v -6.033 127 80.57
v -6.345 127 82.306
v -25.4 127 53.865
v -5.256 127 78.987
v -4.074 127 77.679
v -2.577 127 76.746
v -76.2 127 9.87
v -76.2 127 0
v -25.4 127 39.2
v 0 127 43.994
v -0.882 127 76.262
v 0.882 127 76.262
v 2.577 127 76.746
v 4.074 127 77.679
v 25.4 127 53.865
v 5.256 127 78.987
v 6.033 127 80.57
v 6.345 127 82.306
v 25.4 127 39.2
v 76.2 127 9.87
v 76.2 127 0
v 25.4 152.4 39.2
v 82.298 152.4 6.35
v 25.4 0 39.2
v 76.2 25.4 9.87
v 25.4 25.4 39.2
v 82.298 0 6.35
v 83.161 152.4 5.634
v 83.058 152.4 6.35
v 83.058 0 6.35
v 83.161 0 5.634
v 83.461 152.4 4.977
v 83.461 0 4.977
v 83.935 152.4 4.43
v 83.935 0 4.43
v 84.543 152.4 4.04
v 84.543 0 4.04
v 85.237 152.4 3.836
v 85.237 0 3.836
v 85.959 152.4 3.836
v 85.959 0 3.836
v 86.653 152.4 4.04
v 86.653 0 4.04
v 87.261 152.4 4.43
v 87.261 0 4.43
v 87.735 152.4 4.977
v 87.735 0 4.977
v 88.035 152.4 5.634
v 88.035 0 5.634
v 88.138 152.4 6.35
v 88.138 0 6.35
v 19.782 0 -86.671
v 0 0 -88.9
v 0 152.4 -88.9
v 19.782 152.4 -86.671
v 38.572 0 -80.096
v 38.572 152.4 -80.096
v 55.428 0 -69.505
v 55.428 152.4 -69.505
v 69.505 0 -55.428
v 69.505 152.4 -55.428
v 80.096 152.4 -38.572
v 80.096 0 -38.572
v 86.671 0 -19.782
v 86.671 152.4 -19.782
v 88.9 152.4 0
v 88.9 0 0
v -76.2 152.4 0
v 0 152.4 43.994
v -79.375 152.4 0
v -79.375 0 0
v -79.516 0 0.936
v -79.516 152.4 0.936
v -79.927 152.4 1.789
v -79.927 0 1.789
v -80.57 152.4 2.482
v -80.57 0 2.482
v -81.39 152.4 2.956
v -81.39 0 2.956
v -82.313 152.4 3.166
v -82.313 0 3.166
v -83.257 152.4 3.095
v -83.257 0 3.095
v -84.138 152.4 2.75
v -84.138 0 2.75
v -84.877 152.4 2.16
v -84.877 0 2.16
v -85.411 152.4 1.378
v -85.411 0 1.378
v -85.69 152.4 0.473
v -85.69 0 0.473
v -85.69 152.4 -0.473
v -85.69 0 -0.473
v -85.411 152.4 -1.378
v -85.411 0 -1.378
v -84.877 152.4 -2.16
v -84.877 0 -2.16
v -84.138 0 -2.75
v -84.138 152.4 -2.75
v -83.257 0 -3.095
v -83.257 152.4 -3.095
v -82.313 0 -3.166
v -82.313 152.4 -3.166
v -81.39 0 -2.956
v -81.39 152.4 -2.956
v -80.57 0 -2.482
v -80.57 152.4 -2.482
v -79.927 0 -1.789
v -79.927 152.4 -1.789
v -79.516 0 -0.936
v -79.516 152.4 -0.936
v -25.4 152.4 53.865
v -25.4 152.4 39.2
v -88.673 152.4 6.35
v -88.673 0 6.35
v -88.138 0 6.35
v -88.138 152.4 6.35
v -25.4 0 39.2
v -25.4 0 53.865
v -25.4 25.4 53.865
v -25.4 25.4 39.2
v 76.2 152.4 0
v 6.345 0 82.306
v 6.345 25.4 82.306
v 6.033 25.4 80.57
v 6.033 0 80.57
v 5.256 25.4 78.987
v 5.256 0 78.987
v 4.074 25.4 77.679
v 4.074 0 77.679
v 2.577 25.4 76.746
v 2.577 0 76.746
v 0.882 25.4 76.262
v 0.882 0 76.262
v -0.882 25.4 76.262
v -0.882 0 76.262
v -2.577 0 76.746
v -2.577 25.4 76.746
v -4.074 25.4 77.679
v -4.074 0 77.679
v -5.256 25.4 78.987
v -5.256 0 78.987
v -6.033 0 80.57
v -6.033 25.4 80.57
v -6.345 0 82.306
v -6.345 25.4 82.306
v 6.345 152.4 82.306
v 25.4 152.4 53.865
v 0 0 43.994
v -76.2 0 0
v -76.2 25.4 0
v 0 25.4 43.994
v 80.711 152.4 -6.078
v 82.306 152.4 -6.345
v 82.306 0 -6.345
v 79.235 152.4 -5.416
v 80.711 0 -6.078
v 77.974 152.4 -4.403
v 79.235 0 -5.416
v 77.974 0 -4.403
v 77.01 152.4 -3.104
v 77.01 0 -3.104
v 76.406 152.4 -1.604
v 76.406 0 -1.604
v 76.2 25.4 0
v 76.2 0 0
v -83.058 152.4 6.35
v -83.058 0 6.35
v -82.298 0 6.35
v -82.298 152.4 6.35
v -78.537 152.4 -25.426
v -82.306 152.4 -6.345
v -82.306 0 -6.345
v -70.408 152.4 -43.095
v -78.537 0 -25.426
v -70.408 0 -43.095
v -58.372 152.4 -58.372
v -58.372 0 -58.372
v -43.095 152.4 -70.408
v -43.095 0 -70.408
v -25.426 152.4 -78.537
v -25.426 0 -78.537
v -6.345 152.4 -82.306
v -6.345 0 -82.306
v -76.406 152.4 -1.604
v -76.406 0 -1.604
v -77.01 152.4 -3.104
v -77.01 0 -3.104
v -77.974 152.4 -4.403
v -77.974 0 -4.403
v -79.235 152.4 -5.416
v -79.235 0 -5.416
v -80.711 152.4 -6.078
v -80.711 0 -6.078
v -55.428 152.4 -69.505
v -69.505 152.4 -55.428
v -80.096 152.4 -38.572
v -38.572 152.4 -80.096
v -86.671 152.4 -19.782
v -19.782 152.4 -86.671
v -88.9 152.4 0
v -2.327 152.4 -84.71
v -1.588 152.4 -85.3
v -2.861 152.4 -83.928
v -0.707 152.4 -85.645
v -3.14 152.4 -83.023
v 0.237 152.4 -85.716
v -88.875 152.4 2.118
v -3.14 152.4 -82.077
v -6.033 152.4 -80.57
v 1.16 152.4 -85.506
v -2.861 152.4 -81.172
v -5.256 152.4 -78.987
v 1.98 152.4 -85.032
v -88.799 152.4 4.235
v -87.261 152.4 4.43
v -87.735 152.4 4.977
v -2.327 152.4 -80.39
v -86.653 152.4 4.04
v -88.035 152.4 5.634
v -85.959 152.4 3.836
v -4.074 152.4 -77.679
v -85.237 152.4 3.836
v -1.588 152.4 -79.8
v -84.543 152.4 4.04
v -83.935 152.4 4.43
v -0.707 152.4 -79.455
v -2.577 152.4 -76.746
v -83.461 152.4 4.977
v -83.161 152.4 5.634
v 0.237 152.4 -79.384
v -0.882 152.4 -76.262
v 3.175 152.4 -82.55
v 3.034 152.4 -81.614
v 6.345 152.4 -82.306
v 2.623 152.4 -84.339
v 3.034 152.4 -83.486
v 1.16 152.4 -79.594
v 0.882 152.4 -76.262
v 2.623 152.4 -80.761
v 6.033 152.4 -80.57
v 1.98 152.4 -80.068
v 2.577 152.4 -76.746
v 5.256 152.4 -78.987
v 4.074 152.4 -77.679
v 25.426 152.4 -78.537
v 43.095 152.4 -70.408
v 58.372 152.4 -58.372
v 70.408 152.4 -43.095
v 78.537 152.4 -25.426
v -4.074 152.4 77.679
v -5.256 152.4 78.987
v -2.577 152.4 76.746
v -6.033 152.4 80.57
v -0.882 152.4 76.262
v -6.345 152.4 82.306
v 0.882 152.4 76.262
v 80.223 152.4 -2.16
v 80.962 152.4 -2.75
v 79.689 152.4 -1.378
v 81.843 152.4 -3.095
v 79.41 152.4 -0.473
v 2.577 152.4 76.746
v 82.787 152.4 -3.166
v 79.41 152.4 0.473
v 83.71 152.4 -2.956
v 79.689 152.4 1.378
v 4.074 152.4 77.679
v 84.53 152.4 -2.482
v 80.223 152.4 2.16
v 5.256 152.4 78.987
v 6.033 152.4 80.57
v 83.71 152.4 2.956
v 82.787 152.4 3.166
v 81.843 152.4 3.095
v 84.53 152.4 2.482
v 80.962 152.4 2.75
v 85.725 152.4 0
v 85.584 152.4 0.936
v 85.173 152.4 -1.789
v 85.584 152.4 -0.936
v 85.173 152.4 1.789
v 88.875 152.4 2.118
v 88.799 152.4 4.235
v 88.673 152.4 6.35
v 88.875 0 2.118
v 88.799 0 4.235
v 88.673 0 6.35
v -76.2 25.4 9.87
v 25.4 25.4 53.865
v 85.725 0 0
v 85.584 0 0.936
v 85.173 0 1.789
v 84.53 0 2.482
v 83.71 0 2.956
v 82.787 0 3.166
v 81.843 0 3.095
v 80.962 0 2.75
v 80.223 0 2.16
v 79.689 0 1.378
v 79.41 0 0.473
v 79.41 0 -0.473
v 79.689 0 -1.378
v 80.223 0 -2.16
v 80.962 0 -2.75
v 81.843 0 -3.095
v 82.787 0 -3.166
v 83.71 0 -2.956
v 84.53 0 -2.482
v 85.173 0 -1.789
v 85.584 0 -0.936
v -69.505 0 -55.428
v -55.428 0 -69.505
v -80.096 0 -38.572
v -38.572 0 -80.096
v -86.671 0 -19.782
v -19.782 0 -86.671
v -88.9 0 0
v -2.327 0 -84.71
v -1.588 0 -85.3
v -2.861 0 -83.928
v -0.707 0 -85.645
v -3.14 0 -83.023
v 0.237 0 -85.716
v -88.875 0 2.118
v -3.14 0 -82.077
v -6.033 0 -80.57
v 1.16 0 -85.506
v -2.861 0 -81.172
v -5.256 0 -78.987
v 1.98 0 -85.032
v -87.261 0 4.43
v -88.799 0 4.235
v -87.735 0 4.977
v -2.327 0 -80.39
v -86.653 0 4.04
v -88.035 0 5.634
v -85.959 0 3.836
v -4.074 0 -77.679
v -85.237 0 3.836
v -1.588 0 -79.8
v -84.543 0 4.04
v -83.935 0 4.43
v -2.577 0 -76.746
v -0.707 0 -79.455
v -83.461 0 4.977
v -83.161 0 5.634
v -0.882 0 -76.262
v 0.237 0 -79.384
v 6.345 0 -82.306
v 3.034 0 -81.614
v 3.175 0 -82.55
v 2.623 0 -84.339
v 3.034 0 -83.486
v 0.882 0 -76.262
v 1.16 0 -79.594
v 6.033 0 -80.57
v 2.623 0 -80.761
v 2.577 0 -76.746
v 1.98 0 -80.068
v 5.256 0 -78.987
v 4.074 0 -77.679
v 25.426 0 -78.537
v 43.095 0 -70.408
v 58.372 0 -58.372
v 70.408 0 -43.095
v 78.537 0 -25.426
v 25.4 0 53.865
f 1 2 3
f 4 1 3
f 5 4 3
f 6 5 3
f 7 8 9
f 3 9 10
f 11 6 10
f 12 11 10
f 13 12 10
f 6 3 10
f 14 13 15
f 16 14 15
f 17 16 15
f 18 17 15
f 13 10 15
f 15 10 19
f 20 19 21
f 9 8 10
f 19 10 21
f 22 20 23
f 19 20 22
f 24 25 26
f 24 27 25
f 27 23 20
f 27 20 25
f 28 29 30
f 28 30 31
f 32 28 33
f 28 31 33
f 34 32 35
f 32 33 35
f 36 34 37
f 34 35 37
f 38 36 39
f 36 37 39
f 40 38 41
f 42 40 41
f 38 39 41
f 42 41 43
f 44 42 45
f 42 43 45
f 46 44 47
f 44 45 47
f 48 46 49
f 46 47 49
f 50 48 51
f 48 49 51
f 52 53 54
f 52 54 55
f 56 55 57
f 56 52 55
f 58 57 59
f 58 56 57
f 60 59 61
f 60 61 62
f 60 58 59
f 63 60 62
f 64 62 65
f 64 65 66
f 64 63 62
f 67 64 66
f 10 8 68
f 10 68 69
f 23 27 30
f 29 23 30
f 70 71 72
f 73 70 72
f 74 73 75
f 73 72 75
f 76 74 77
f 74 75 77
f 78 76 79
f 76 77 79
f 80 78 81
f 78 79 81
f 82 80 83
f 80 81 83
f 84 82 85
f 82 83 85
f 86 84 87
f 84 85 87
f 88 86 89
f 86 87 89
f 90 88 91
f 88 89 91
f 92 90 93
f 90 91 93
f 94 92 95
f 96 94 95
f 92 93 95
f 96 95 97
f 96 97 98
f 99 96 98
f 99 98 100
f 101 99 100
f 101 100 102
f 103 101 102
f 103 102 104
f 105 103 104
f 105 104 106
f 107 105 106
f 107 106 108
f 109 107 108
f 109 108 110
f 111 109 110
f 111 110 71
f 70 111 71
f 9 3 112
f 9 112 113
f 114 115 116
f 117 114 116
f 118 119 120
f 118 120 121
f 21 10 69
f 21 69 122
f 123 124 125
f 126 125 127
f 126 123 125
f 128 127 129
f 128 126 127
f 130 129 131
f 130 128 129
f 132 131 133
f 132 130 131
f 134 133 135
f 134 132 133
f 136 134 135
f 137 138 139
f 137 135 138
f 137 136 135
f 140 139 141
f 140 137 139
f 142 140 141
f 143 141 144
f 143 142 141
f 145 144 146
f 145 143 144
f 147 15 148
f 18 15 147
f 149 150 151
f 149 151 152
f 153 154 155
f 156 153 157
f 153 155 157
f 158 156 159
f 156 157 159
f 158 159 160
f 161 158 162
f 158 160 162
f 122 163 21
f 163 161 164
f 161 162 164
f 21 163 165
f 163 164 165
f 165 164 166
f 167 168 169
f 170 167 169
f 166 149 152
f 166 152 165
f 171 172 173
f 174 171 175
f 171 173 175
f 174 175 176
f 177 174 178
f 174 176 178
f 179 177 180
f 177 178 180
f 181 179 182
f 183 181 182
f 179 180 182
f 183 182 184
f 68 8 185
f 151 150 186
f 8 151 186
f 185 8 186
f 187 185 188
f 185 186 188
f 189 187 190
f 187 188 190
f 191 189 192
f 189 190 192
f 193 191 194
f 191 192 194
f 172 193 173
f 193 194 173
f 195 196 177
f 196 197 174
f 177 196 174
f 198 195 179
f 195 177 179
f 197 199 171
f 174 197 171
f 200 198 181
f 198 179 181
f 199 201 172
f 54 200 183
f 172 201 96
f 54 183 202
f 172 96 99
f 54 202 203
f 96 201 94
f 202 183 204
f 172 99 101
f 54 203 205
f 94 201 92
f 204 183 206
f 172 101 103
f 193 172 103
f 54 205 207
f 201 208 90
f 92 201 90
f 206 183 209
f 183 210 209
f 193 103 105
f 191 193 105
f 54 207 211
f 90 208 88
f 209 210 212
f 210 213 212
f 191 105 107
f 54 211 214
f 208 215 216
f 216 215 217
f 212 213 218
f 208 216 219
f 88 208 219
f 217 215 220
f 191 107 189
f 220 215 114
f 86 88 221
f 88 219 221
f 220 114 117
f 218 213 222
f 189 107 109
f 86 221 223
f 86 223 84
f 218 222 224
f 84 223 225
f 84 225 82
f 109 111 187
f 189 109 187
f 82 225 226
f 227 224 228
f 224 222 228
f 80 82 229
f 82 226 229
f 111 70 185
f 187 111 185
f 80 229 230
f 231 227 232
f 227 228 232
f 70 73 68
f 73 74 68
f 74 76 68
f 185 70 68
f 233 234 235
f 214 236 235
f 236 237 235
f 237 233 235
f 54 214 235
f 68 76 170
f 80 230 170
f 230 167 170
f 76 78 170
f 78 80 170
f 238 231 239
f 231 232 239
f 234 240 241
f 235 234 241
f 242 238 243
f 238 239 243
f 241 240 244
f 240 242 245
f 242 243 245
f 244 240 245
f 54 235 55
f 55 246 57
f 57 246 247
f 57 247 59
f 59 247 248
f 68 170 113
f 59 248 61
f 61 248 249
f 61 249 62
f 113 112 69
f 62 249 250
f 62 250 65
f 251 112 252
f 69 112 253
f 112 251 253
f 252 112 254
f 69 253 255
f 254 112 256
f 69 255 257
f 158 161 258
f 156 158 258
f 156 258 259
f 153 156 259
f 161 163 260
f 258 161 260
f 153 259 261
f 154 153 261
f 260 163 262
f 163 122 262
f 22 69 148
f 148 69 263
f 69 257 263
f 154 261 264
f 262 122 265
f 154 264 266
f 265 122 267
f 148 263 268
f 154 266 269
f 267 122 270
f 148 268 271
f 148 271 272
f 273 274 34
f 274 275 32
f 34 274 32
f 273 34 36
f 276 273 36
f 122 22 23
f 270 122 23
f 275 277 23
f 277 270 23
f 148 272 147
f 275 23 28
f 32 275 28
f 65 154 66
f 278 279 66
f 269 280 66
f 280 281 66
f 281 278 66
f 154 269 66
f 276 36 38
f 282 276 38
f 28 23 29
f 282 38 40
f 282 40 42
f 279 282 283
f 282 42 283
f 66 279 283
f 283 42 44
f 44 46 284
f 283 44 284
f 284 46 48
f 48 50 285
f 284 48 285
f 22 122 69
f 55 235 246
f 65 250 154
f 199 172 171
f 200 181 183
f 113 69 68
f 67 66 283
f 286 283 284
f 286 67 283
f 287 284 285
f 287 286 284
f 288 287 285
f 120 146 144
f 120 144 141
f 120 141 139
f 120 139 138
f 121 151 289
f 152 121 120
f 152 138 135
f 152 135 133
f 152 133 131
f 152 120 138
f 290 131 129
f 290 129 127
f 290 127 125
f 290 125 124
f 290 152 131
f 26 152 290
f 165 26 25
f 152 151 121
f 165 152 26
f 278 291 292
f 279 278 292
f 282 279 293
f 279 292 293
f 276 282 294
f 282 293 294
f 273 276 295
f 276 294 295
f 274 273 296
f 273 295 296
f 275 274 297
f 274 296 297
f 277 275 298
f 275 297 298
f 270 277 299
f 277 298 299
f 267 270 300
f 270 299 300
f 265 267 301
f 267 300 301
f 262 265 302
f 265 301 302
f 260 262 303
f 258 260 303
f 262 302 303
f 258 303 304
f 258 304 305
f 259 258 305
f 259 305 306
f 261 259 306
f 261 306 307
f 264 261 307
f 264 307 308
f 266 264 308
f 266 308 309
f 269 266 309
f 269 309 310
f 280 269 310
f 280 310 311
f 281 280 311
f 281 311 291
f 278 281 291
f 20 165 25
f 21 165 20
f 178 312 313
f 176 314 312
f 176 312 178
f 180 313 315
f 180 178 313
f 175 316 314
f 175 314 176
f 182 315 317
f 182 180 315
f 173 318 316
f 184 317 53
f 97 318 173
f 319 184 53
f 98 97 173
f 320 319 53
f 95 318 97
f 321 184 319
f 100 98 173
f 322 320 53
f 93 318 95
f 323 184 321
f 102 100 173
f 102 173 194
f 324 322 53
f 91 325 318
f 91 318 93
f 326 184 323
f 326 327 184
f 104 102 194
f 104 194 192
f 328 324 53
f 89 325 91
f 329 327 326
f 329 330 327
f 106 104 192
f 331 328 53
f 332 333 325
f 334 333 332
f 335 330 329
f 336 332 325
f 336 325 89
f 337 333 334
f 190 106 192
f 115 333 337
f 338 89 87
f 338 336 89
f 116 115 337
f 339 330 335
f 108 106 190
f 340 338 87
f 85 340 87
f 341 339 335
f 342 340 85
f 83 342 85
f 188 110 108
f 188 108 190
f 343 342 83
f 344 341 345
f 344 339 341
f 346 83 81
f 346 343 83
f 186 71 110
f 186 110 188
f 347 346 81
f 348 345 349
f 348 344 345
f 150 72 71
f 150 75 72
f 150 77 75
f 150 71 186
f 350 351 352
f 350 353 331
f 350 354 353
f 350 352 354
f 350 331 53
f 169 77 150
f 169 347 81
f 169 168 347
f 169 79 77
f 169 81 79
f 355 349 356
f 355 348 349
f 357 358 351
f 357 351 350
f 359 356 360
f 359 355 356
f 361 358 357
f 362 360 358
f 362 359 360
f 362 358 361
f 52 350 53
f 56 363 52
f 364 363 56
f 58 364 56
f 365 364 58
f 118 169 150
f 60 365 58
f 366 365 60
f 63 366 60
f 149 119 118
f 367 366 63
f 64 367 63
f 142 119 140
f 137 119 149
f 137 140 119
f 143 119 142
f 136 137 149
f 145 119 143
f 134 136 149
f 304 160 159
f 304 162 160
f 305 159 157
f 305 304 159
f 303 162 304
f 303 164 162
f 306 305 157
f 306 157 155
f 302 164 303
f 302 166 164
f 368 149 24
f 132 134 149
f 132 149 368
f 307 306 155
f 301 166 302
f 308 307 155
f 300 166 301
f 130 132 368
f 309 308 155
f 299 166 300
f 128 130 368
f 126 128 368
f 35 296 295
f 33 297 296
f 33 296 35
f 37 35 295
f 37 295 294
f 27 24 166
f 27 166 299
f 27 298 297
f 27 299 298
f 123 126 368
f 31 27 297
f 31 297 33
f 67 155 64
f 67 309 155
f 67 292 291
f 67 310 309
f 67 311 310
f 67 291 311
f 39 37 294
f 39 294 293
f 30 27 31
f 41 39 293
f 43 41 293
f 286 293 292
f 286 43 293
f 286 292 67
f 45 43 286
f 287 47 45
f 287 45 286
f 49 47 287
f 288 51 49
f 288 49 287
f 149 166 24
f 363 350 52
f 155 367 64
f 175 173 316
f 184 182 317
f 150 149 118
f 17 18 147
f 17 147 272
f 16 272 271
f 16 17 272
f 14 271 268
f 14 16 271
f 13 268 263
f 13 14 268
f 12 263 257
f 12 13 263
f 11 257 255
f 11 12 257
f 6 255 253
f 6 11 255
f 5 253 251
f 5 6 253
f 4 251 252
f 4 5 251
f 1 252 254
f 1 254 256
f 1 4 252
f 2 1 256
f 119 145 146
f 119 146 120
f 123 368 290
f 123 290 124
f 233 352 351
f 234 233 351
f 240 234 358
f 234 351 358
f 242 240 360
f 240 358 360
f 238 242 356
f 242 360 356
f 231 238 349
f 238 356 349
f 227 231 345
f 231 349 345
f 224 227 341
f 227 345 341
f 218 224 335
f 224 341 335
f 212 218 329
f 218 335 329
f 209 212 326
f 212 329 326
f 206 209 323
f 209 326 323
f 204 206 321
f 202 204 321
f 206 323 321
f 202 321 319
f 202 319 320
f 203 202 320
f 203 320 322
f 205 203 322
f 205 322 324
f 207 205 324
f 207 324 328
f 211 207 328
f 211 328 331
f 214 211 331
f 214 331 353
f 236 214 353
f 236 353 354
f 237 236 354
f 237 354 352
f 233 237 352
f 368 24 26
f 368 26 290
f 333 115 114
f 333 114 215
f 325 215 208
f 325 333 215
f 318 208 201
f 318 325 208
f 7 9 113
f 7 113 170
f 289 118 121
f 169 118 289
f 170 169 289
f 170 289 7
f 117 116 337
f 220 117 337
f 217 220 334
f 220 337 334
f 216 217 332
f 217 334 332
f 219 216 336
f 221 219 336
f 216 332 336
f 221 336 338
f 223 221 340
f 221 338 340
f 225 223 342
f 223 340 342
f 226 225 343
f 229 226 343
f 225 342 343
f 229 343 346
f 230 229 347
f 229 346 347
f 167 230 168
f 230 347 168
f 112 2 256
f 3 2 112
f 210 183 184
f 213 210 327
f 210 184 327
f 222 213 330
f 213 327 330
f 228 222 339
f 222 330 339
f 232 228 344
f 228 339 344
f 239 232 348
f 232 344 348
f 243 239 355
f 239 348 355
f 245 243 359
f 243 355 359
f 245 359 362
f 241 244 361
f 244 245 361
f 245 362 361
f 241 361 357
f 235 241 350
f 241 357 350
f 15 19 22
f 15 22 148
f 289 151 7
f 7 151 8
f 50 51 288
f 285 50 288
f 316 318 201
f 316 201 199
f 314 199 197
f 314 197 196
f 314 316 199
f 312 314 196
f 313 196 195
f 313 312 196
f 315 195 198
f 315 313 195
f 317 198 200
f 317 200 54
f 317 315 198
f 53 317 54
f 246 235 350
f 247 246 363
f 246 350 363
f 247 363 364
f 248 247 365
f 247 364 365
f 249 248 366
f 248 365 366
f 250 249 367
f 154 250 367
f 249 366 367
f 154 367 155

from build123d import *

# Parameters (mm, degrees)
F1_DEPTH  = 152.4
F2_R      = 3.175
F3_DEPTH  = 152.401
F5_DEPTH  = 152.401
F6_R      = 2.54
F7_DEPTH  = 152.401
F8_DEPTH  = 152.4
F9_W      = 152.4
F9_H      = 101.6
F10_DEPTH = 82.3067692308


# Not quite as in the source:
# - a feature names something its author has since deleted; it is built from what else it names


with BuildPart() as f1:
    # F0 (on Front) → F1 (new body)
    with BuildSketch(Plane.XZ):
        with BuildLine():
            ThreePointArc((-2.11e-07, -88.9), (62.8617927729, -62.8617929221), (88.9, 0))
            ThreePointArc((88.9, 0), (62.8617928475, 62.8617928475), (0, 88.9))
            ThreePointArc((0, 88.9), (-62.8617927742, 62.8617929208), (-88.9, 2.073e-07))
            ThreePointArc((-88.9, 2.073e-07), (-62.8617929954, -62.8617926996), (-2.11e-07, -88.9))
        make_face()
    extrude(amount=-F1_DEPTH)

    # F2 (on face) → F3 (cut, through all)
    with BuildSketch(Plane.XZ):
        with Locations((0, -82.55)):
            Circle(F2_R)
        with Locations((82.55, 0)):
            Circle(F2_R)
        with Locations((-82.55, 0)):
            Circle(F2_R)
    extrude(amount=-F3_DEPTH, mode=Mode.SUBTRACT)

    # F4 (on face) → F5 (cut, through all)
    with BuildSketch(Plane.XZ):
        Polygon((-94.202041626, 6.35), (0, 6.35), (132.5988769531, 6.35), (114.2803505063, 107.1024313569), (-94.202041626, 107.1024313569), align=None)
    extrude(amount=-F5_DEPTH, mode=Mode.SUBTRACT)

    # F6 (on face) + F2 (on face) → F7 (cut, through all)
    with BuildSketch(Plane.XZ):
        with Locations((-85.598, 6.35)):
            Circle(F6_R)
        with BuildLine():
            ThreePointArc((88.138, 6.35), (85.598, 8.89), (83.058, 6.35))
            ThreePointArc((83.058, 6.35), (85.598, 3.81), (88.138, 6.35))
        make_face()
    with BuildSketch(Plane.XZ):
        with BuildLine():
            Line((0, 43.9940905122), (-76.2, 0))
            ThreePointArc((-76.2, 0), (-77.974338005, -4.4029328075), (-82.3057692308, -6.3453015162))
            ThreePointArc((-82.3057692308, -6.3453015162), (-58.3716647869, -58.3716647869), (-6.3453015162, -82.3057692308))
            ThreePointArc((-6.3453015162, -82.3057692308), (0, -76.2), (6.3453015162, -82.3057692308))
            ThreePointArc((6.3453015162, -82.3057692308), (58.3716647869, -58.3716647869), (82.3057692308, -6.3453015162))
            ThreePointArc((82.3057692308, -6.3453015162), (77.974338005, -4.4029328075), (76.2, 0))
            Line((76.2, 0), (0, 43.9940905122))
        make_face()
    extrude(amount=-F7_DEPTH, mode=Mode.SUBTRACT)

    # F2 (on face) → F8 (join)
    with BuildSketch(Plane.XZ):
        with BuildLine():
            Line((0, 53.8645595374), (-25.4, 53.8645595374))
            Line((-25.4, 53.8645595374), (-25.4, 39.1998627))
            Line((-25.4, 39.1998627), (-82.3057692308, 6.3453015162))
            ThreePointArc((-82.3057692308, 6.3453015162), (-77.974338005, 4.4029328075), (-76.2, 0))
            Line((-76.2, 0), (0, 43.9940905122))
            Line((0, 43.9940905122), (76.2, 0))
            ThreePointArc((76.2, 0), (77.974338005, 4.4029328075), (82.3057692308, 6.3453015162))
            Line((82.3057692308, 6.3453015162), (25.4, 39.1998627))
            Line((25.4, 39.1998627), (25.4, 53.8645595374))
            Line((25.4, 53.8645595374), (0, 53.8645595374))
        make_face()
        with BuildLine():
            ThreePointArc((6.3453015162, 82.3057692308), (0, 76.2), (-6.3453015162, 82.3057692308))
            Line((-6.3453015162, 82.3057692308), (-25.4, 53.8645595374))
            Line((-25.4, 53.8645595374), (0, 53.8645595374))
            Line((0, 53.8645595374), (25.4, 53.8645595374))
            Line((25.4, 53.8645595374), (6.3453015162, 82.3057692308))
        make_face()
    extrude(amount=-F8_DEPTH)

    # F9 (on Top) → F10 (cut, through all)
    with BuildSketch(Plane.XY):
        with Locations((0, 76.2)):
            Rectangle(F9_W, F9_H)
    extrude(amount=F10_DEPTH, mode=Mode.SUBTRACT)


solid = f1.part
